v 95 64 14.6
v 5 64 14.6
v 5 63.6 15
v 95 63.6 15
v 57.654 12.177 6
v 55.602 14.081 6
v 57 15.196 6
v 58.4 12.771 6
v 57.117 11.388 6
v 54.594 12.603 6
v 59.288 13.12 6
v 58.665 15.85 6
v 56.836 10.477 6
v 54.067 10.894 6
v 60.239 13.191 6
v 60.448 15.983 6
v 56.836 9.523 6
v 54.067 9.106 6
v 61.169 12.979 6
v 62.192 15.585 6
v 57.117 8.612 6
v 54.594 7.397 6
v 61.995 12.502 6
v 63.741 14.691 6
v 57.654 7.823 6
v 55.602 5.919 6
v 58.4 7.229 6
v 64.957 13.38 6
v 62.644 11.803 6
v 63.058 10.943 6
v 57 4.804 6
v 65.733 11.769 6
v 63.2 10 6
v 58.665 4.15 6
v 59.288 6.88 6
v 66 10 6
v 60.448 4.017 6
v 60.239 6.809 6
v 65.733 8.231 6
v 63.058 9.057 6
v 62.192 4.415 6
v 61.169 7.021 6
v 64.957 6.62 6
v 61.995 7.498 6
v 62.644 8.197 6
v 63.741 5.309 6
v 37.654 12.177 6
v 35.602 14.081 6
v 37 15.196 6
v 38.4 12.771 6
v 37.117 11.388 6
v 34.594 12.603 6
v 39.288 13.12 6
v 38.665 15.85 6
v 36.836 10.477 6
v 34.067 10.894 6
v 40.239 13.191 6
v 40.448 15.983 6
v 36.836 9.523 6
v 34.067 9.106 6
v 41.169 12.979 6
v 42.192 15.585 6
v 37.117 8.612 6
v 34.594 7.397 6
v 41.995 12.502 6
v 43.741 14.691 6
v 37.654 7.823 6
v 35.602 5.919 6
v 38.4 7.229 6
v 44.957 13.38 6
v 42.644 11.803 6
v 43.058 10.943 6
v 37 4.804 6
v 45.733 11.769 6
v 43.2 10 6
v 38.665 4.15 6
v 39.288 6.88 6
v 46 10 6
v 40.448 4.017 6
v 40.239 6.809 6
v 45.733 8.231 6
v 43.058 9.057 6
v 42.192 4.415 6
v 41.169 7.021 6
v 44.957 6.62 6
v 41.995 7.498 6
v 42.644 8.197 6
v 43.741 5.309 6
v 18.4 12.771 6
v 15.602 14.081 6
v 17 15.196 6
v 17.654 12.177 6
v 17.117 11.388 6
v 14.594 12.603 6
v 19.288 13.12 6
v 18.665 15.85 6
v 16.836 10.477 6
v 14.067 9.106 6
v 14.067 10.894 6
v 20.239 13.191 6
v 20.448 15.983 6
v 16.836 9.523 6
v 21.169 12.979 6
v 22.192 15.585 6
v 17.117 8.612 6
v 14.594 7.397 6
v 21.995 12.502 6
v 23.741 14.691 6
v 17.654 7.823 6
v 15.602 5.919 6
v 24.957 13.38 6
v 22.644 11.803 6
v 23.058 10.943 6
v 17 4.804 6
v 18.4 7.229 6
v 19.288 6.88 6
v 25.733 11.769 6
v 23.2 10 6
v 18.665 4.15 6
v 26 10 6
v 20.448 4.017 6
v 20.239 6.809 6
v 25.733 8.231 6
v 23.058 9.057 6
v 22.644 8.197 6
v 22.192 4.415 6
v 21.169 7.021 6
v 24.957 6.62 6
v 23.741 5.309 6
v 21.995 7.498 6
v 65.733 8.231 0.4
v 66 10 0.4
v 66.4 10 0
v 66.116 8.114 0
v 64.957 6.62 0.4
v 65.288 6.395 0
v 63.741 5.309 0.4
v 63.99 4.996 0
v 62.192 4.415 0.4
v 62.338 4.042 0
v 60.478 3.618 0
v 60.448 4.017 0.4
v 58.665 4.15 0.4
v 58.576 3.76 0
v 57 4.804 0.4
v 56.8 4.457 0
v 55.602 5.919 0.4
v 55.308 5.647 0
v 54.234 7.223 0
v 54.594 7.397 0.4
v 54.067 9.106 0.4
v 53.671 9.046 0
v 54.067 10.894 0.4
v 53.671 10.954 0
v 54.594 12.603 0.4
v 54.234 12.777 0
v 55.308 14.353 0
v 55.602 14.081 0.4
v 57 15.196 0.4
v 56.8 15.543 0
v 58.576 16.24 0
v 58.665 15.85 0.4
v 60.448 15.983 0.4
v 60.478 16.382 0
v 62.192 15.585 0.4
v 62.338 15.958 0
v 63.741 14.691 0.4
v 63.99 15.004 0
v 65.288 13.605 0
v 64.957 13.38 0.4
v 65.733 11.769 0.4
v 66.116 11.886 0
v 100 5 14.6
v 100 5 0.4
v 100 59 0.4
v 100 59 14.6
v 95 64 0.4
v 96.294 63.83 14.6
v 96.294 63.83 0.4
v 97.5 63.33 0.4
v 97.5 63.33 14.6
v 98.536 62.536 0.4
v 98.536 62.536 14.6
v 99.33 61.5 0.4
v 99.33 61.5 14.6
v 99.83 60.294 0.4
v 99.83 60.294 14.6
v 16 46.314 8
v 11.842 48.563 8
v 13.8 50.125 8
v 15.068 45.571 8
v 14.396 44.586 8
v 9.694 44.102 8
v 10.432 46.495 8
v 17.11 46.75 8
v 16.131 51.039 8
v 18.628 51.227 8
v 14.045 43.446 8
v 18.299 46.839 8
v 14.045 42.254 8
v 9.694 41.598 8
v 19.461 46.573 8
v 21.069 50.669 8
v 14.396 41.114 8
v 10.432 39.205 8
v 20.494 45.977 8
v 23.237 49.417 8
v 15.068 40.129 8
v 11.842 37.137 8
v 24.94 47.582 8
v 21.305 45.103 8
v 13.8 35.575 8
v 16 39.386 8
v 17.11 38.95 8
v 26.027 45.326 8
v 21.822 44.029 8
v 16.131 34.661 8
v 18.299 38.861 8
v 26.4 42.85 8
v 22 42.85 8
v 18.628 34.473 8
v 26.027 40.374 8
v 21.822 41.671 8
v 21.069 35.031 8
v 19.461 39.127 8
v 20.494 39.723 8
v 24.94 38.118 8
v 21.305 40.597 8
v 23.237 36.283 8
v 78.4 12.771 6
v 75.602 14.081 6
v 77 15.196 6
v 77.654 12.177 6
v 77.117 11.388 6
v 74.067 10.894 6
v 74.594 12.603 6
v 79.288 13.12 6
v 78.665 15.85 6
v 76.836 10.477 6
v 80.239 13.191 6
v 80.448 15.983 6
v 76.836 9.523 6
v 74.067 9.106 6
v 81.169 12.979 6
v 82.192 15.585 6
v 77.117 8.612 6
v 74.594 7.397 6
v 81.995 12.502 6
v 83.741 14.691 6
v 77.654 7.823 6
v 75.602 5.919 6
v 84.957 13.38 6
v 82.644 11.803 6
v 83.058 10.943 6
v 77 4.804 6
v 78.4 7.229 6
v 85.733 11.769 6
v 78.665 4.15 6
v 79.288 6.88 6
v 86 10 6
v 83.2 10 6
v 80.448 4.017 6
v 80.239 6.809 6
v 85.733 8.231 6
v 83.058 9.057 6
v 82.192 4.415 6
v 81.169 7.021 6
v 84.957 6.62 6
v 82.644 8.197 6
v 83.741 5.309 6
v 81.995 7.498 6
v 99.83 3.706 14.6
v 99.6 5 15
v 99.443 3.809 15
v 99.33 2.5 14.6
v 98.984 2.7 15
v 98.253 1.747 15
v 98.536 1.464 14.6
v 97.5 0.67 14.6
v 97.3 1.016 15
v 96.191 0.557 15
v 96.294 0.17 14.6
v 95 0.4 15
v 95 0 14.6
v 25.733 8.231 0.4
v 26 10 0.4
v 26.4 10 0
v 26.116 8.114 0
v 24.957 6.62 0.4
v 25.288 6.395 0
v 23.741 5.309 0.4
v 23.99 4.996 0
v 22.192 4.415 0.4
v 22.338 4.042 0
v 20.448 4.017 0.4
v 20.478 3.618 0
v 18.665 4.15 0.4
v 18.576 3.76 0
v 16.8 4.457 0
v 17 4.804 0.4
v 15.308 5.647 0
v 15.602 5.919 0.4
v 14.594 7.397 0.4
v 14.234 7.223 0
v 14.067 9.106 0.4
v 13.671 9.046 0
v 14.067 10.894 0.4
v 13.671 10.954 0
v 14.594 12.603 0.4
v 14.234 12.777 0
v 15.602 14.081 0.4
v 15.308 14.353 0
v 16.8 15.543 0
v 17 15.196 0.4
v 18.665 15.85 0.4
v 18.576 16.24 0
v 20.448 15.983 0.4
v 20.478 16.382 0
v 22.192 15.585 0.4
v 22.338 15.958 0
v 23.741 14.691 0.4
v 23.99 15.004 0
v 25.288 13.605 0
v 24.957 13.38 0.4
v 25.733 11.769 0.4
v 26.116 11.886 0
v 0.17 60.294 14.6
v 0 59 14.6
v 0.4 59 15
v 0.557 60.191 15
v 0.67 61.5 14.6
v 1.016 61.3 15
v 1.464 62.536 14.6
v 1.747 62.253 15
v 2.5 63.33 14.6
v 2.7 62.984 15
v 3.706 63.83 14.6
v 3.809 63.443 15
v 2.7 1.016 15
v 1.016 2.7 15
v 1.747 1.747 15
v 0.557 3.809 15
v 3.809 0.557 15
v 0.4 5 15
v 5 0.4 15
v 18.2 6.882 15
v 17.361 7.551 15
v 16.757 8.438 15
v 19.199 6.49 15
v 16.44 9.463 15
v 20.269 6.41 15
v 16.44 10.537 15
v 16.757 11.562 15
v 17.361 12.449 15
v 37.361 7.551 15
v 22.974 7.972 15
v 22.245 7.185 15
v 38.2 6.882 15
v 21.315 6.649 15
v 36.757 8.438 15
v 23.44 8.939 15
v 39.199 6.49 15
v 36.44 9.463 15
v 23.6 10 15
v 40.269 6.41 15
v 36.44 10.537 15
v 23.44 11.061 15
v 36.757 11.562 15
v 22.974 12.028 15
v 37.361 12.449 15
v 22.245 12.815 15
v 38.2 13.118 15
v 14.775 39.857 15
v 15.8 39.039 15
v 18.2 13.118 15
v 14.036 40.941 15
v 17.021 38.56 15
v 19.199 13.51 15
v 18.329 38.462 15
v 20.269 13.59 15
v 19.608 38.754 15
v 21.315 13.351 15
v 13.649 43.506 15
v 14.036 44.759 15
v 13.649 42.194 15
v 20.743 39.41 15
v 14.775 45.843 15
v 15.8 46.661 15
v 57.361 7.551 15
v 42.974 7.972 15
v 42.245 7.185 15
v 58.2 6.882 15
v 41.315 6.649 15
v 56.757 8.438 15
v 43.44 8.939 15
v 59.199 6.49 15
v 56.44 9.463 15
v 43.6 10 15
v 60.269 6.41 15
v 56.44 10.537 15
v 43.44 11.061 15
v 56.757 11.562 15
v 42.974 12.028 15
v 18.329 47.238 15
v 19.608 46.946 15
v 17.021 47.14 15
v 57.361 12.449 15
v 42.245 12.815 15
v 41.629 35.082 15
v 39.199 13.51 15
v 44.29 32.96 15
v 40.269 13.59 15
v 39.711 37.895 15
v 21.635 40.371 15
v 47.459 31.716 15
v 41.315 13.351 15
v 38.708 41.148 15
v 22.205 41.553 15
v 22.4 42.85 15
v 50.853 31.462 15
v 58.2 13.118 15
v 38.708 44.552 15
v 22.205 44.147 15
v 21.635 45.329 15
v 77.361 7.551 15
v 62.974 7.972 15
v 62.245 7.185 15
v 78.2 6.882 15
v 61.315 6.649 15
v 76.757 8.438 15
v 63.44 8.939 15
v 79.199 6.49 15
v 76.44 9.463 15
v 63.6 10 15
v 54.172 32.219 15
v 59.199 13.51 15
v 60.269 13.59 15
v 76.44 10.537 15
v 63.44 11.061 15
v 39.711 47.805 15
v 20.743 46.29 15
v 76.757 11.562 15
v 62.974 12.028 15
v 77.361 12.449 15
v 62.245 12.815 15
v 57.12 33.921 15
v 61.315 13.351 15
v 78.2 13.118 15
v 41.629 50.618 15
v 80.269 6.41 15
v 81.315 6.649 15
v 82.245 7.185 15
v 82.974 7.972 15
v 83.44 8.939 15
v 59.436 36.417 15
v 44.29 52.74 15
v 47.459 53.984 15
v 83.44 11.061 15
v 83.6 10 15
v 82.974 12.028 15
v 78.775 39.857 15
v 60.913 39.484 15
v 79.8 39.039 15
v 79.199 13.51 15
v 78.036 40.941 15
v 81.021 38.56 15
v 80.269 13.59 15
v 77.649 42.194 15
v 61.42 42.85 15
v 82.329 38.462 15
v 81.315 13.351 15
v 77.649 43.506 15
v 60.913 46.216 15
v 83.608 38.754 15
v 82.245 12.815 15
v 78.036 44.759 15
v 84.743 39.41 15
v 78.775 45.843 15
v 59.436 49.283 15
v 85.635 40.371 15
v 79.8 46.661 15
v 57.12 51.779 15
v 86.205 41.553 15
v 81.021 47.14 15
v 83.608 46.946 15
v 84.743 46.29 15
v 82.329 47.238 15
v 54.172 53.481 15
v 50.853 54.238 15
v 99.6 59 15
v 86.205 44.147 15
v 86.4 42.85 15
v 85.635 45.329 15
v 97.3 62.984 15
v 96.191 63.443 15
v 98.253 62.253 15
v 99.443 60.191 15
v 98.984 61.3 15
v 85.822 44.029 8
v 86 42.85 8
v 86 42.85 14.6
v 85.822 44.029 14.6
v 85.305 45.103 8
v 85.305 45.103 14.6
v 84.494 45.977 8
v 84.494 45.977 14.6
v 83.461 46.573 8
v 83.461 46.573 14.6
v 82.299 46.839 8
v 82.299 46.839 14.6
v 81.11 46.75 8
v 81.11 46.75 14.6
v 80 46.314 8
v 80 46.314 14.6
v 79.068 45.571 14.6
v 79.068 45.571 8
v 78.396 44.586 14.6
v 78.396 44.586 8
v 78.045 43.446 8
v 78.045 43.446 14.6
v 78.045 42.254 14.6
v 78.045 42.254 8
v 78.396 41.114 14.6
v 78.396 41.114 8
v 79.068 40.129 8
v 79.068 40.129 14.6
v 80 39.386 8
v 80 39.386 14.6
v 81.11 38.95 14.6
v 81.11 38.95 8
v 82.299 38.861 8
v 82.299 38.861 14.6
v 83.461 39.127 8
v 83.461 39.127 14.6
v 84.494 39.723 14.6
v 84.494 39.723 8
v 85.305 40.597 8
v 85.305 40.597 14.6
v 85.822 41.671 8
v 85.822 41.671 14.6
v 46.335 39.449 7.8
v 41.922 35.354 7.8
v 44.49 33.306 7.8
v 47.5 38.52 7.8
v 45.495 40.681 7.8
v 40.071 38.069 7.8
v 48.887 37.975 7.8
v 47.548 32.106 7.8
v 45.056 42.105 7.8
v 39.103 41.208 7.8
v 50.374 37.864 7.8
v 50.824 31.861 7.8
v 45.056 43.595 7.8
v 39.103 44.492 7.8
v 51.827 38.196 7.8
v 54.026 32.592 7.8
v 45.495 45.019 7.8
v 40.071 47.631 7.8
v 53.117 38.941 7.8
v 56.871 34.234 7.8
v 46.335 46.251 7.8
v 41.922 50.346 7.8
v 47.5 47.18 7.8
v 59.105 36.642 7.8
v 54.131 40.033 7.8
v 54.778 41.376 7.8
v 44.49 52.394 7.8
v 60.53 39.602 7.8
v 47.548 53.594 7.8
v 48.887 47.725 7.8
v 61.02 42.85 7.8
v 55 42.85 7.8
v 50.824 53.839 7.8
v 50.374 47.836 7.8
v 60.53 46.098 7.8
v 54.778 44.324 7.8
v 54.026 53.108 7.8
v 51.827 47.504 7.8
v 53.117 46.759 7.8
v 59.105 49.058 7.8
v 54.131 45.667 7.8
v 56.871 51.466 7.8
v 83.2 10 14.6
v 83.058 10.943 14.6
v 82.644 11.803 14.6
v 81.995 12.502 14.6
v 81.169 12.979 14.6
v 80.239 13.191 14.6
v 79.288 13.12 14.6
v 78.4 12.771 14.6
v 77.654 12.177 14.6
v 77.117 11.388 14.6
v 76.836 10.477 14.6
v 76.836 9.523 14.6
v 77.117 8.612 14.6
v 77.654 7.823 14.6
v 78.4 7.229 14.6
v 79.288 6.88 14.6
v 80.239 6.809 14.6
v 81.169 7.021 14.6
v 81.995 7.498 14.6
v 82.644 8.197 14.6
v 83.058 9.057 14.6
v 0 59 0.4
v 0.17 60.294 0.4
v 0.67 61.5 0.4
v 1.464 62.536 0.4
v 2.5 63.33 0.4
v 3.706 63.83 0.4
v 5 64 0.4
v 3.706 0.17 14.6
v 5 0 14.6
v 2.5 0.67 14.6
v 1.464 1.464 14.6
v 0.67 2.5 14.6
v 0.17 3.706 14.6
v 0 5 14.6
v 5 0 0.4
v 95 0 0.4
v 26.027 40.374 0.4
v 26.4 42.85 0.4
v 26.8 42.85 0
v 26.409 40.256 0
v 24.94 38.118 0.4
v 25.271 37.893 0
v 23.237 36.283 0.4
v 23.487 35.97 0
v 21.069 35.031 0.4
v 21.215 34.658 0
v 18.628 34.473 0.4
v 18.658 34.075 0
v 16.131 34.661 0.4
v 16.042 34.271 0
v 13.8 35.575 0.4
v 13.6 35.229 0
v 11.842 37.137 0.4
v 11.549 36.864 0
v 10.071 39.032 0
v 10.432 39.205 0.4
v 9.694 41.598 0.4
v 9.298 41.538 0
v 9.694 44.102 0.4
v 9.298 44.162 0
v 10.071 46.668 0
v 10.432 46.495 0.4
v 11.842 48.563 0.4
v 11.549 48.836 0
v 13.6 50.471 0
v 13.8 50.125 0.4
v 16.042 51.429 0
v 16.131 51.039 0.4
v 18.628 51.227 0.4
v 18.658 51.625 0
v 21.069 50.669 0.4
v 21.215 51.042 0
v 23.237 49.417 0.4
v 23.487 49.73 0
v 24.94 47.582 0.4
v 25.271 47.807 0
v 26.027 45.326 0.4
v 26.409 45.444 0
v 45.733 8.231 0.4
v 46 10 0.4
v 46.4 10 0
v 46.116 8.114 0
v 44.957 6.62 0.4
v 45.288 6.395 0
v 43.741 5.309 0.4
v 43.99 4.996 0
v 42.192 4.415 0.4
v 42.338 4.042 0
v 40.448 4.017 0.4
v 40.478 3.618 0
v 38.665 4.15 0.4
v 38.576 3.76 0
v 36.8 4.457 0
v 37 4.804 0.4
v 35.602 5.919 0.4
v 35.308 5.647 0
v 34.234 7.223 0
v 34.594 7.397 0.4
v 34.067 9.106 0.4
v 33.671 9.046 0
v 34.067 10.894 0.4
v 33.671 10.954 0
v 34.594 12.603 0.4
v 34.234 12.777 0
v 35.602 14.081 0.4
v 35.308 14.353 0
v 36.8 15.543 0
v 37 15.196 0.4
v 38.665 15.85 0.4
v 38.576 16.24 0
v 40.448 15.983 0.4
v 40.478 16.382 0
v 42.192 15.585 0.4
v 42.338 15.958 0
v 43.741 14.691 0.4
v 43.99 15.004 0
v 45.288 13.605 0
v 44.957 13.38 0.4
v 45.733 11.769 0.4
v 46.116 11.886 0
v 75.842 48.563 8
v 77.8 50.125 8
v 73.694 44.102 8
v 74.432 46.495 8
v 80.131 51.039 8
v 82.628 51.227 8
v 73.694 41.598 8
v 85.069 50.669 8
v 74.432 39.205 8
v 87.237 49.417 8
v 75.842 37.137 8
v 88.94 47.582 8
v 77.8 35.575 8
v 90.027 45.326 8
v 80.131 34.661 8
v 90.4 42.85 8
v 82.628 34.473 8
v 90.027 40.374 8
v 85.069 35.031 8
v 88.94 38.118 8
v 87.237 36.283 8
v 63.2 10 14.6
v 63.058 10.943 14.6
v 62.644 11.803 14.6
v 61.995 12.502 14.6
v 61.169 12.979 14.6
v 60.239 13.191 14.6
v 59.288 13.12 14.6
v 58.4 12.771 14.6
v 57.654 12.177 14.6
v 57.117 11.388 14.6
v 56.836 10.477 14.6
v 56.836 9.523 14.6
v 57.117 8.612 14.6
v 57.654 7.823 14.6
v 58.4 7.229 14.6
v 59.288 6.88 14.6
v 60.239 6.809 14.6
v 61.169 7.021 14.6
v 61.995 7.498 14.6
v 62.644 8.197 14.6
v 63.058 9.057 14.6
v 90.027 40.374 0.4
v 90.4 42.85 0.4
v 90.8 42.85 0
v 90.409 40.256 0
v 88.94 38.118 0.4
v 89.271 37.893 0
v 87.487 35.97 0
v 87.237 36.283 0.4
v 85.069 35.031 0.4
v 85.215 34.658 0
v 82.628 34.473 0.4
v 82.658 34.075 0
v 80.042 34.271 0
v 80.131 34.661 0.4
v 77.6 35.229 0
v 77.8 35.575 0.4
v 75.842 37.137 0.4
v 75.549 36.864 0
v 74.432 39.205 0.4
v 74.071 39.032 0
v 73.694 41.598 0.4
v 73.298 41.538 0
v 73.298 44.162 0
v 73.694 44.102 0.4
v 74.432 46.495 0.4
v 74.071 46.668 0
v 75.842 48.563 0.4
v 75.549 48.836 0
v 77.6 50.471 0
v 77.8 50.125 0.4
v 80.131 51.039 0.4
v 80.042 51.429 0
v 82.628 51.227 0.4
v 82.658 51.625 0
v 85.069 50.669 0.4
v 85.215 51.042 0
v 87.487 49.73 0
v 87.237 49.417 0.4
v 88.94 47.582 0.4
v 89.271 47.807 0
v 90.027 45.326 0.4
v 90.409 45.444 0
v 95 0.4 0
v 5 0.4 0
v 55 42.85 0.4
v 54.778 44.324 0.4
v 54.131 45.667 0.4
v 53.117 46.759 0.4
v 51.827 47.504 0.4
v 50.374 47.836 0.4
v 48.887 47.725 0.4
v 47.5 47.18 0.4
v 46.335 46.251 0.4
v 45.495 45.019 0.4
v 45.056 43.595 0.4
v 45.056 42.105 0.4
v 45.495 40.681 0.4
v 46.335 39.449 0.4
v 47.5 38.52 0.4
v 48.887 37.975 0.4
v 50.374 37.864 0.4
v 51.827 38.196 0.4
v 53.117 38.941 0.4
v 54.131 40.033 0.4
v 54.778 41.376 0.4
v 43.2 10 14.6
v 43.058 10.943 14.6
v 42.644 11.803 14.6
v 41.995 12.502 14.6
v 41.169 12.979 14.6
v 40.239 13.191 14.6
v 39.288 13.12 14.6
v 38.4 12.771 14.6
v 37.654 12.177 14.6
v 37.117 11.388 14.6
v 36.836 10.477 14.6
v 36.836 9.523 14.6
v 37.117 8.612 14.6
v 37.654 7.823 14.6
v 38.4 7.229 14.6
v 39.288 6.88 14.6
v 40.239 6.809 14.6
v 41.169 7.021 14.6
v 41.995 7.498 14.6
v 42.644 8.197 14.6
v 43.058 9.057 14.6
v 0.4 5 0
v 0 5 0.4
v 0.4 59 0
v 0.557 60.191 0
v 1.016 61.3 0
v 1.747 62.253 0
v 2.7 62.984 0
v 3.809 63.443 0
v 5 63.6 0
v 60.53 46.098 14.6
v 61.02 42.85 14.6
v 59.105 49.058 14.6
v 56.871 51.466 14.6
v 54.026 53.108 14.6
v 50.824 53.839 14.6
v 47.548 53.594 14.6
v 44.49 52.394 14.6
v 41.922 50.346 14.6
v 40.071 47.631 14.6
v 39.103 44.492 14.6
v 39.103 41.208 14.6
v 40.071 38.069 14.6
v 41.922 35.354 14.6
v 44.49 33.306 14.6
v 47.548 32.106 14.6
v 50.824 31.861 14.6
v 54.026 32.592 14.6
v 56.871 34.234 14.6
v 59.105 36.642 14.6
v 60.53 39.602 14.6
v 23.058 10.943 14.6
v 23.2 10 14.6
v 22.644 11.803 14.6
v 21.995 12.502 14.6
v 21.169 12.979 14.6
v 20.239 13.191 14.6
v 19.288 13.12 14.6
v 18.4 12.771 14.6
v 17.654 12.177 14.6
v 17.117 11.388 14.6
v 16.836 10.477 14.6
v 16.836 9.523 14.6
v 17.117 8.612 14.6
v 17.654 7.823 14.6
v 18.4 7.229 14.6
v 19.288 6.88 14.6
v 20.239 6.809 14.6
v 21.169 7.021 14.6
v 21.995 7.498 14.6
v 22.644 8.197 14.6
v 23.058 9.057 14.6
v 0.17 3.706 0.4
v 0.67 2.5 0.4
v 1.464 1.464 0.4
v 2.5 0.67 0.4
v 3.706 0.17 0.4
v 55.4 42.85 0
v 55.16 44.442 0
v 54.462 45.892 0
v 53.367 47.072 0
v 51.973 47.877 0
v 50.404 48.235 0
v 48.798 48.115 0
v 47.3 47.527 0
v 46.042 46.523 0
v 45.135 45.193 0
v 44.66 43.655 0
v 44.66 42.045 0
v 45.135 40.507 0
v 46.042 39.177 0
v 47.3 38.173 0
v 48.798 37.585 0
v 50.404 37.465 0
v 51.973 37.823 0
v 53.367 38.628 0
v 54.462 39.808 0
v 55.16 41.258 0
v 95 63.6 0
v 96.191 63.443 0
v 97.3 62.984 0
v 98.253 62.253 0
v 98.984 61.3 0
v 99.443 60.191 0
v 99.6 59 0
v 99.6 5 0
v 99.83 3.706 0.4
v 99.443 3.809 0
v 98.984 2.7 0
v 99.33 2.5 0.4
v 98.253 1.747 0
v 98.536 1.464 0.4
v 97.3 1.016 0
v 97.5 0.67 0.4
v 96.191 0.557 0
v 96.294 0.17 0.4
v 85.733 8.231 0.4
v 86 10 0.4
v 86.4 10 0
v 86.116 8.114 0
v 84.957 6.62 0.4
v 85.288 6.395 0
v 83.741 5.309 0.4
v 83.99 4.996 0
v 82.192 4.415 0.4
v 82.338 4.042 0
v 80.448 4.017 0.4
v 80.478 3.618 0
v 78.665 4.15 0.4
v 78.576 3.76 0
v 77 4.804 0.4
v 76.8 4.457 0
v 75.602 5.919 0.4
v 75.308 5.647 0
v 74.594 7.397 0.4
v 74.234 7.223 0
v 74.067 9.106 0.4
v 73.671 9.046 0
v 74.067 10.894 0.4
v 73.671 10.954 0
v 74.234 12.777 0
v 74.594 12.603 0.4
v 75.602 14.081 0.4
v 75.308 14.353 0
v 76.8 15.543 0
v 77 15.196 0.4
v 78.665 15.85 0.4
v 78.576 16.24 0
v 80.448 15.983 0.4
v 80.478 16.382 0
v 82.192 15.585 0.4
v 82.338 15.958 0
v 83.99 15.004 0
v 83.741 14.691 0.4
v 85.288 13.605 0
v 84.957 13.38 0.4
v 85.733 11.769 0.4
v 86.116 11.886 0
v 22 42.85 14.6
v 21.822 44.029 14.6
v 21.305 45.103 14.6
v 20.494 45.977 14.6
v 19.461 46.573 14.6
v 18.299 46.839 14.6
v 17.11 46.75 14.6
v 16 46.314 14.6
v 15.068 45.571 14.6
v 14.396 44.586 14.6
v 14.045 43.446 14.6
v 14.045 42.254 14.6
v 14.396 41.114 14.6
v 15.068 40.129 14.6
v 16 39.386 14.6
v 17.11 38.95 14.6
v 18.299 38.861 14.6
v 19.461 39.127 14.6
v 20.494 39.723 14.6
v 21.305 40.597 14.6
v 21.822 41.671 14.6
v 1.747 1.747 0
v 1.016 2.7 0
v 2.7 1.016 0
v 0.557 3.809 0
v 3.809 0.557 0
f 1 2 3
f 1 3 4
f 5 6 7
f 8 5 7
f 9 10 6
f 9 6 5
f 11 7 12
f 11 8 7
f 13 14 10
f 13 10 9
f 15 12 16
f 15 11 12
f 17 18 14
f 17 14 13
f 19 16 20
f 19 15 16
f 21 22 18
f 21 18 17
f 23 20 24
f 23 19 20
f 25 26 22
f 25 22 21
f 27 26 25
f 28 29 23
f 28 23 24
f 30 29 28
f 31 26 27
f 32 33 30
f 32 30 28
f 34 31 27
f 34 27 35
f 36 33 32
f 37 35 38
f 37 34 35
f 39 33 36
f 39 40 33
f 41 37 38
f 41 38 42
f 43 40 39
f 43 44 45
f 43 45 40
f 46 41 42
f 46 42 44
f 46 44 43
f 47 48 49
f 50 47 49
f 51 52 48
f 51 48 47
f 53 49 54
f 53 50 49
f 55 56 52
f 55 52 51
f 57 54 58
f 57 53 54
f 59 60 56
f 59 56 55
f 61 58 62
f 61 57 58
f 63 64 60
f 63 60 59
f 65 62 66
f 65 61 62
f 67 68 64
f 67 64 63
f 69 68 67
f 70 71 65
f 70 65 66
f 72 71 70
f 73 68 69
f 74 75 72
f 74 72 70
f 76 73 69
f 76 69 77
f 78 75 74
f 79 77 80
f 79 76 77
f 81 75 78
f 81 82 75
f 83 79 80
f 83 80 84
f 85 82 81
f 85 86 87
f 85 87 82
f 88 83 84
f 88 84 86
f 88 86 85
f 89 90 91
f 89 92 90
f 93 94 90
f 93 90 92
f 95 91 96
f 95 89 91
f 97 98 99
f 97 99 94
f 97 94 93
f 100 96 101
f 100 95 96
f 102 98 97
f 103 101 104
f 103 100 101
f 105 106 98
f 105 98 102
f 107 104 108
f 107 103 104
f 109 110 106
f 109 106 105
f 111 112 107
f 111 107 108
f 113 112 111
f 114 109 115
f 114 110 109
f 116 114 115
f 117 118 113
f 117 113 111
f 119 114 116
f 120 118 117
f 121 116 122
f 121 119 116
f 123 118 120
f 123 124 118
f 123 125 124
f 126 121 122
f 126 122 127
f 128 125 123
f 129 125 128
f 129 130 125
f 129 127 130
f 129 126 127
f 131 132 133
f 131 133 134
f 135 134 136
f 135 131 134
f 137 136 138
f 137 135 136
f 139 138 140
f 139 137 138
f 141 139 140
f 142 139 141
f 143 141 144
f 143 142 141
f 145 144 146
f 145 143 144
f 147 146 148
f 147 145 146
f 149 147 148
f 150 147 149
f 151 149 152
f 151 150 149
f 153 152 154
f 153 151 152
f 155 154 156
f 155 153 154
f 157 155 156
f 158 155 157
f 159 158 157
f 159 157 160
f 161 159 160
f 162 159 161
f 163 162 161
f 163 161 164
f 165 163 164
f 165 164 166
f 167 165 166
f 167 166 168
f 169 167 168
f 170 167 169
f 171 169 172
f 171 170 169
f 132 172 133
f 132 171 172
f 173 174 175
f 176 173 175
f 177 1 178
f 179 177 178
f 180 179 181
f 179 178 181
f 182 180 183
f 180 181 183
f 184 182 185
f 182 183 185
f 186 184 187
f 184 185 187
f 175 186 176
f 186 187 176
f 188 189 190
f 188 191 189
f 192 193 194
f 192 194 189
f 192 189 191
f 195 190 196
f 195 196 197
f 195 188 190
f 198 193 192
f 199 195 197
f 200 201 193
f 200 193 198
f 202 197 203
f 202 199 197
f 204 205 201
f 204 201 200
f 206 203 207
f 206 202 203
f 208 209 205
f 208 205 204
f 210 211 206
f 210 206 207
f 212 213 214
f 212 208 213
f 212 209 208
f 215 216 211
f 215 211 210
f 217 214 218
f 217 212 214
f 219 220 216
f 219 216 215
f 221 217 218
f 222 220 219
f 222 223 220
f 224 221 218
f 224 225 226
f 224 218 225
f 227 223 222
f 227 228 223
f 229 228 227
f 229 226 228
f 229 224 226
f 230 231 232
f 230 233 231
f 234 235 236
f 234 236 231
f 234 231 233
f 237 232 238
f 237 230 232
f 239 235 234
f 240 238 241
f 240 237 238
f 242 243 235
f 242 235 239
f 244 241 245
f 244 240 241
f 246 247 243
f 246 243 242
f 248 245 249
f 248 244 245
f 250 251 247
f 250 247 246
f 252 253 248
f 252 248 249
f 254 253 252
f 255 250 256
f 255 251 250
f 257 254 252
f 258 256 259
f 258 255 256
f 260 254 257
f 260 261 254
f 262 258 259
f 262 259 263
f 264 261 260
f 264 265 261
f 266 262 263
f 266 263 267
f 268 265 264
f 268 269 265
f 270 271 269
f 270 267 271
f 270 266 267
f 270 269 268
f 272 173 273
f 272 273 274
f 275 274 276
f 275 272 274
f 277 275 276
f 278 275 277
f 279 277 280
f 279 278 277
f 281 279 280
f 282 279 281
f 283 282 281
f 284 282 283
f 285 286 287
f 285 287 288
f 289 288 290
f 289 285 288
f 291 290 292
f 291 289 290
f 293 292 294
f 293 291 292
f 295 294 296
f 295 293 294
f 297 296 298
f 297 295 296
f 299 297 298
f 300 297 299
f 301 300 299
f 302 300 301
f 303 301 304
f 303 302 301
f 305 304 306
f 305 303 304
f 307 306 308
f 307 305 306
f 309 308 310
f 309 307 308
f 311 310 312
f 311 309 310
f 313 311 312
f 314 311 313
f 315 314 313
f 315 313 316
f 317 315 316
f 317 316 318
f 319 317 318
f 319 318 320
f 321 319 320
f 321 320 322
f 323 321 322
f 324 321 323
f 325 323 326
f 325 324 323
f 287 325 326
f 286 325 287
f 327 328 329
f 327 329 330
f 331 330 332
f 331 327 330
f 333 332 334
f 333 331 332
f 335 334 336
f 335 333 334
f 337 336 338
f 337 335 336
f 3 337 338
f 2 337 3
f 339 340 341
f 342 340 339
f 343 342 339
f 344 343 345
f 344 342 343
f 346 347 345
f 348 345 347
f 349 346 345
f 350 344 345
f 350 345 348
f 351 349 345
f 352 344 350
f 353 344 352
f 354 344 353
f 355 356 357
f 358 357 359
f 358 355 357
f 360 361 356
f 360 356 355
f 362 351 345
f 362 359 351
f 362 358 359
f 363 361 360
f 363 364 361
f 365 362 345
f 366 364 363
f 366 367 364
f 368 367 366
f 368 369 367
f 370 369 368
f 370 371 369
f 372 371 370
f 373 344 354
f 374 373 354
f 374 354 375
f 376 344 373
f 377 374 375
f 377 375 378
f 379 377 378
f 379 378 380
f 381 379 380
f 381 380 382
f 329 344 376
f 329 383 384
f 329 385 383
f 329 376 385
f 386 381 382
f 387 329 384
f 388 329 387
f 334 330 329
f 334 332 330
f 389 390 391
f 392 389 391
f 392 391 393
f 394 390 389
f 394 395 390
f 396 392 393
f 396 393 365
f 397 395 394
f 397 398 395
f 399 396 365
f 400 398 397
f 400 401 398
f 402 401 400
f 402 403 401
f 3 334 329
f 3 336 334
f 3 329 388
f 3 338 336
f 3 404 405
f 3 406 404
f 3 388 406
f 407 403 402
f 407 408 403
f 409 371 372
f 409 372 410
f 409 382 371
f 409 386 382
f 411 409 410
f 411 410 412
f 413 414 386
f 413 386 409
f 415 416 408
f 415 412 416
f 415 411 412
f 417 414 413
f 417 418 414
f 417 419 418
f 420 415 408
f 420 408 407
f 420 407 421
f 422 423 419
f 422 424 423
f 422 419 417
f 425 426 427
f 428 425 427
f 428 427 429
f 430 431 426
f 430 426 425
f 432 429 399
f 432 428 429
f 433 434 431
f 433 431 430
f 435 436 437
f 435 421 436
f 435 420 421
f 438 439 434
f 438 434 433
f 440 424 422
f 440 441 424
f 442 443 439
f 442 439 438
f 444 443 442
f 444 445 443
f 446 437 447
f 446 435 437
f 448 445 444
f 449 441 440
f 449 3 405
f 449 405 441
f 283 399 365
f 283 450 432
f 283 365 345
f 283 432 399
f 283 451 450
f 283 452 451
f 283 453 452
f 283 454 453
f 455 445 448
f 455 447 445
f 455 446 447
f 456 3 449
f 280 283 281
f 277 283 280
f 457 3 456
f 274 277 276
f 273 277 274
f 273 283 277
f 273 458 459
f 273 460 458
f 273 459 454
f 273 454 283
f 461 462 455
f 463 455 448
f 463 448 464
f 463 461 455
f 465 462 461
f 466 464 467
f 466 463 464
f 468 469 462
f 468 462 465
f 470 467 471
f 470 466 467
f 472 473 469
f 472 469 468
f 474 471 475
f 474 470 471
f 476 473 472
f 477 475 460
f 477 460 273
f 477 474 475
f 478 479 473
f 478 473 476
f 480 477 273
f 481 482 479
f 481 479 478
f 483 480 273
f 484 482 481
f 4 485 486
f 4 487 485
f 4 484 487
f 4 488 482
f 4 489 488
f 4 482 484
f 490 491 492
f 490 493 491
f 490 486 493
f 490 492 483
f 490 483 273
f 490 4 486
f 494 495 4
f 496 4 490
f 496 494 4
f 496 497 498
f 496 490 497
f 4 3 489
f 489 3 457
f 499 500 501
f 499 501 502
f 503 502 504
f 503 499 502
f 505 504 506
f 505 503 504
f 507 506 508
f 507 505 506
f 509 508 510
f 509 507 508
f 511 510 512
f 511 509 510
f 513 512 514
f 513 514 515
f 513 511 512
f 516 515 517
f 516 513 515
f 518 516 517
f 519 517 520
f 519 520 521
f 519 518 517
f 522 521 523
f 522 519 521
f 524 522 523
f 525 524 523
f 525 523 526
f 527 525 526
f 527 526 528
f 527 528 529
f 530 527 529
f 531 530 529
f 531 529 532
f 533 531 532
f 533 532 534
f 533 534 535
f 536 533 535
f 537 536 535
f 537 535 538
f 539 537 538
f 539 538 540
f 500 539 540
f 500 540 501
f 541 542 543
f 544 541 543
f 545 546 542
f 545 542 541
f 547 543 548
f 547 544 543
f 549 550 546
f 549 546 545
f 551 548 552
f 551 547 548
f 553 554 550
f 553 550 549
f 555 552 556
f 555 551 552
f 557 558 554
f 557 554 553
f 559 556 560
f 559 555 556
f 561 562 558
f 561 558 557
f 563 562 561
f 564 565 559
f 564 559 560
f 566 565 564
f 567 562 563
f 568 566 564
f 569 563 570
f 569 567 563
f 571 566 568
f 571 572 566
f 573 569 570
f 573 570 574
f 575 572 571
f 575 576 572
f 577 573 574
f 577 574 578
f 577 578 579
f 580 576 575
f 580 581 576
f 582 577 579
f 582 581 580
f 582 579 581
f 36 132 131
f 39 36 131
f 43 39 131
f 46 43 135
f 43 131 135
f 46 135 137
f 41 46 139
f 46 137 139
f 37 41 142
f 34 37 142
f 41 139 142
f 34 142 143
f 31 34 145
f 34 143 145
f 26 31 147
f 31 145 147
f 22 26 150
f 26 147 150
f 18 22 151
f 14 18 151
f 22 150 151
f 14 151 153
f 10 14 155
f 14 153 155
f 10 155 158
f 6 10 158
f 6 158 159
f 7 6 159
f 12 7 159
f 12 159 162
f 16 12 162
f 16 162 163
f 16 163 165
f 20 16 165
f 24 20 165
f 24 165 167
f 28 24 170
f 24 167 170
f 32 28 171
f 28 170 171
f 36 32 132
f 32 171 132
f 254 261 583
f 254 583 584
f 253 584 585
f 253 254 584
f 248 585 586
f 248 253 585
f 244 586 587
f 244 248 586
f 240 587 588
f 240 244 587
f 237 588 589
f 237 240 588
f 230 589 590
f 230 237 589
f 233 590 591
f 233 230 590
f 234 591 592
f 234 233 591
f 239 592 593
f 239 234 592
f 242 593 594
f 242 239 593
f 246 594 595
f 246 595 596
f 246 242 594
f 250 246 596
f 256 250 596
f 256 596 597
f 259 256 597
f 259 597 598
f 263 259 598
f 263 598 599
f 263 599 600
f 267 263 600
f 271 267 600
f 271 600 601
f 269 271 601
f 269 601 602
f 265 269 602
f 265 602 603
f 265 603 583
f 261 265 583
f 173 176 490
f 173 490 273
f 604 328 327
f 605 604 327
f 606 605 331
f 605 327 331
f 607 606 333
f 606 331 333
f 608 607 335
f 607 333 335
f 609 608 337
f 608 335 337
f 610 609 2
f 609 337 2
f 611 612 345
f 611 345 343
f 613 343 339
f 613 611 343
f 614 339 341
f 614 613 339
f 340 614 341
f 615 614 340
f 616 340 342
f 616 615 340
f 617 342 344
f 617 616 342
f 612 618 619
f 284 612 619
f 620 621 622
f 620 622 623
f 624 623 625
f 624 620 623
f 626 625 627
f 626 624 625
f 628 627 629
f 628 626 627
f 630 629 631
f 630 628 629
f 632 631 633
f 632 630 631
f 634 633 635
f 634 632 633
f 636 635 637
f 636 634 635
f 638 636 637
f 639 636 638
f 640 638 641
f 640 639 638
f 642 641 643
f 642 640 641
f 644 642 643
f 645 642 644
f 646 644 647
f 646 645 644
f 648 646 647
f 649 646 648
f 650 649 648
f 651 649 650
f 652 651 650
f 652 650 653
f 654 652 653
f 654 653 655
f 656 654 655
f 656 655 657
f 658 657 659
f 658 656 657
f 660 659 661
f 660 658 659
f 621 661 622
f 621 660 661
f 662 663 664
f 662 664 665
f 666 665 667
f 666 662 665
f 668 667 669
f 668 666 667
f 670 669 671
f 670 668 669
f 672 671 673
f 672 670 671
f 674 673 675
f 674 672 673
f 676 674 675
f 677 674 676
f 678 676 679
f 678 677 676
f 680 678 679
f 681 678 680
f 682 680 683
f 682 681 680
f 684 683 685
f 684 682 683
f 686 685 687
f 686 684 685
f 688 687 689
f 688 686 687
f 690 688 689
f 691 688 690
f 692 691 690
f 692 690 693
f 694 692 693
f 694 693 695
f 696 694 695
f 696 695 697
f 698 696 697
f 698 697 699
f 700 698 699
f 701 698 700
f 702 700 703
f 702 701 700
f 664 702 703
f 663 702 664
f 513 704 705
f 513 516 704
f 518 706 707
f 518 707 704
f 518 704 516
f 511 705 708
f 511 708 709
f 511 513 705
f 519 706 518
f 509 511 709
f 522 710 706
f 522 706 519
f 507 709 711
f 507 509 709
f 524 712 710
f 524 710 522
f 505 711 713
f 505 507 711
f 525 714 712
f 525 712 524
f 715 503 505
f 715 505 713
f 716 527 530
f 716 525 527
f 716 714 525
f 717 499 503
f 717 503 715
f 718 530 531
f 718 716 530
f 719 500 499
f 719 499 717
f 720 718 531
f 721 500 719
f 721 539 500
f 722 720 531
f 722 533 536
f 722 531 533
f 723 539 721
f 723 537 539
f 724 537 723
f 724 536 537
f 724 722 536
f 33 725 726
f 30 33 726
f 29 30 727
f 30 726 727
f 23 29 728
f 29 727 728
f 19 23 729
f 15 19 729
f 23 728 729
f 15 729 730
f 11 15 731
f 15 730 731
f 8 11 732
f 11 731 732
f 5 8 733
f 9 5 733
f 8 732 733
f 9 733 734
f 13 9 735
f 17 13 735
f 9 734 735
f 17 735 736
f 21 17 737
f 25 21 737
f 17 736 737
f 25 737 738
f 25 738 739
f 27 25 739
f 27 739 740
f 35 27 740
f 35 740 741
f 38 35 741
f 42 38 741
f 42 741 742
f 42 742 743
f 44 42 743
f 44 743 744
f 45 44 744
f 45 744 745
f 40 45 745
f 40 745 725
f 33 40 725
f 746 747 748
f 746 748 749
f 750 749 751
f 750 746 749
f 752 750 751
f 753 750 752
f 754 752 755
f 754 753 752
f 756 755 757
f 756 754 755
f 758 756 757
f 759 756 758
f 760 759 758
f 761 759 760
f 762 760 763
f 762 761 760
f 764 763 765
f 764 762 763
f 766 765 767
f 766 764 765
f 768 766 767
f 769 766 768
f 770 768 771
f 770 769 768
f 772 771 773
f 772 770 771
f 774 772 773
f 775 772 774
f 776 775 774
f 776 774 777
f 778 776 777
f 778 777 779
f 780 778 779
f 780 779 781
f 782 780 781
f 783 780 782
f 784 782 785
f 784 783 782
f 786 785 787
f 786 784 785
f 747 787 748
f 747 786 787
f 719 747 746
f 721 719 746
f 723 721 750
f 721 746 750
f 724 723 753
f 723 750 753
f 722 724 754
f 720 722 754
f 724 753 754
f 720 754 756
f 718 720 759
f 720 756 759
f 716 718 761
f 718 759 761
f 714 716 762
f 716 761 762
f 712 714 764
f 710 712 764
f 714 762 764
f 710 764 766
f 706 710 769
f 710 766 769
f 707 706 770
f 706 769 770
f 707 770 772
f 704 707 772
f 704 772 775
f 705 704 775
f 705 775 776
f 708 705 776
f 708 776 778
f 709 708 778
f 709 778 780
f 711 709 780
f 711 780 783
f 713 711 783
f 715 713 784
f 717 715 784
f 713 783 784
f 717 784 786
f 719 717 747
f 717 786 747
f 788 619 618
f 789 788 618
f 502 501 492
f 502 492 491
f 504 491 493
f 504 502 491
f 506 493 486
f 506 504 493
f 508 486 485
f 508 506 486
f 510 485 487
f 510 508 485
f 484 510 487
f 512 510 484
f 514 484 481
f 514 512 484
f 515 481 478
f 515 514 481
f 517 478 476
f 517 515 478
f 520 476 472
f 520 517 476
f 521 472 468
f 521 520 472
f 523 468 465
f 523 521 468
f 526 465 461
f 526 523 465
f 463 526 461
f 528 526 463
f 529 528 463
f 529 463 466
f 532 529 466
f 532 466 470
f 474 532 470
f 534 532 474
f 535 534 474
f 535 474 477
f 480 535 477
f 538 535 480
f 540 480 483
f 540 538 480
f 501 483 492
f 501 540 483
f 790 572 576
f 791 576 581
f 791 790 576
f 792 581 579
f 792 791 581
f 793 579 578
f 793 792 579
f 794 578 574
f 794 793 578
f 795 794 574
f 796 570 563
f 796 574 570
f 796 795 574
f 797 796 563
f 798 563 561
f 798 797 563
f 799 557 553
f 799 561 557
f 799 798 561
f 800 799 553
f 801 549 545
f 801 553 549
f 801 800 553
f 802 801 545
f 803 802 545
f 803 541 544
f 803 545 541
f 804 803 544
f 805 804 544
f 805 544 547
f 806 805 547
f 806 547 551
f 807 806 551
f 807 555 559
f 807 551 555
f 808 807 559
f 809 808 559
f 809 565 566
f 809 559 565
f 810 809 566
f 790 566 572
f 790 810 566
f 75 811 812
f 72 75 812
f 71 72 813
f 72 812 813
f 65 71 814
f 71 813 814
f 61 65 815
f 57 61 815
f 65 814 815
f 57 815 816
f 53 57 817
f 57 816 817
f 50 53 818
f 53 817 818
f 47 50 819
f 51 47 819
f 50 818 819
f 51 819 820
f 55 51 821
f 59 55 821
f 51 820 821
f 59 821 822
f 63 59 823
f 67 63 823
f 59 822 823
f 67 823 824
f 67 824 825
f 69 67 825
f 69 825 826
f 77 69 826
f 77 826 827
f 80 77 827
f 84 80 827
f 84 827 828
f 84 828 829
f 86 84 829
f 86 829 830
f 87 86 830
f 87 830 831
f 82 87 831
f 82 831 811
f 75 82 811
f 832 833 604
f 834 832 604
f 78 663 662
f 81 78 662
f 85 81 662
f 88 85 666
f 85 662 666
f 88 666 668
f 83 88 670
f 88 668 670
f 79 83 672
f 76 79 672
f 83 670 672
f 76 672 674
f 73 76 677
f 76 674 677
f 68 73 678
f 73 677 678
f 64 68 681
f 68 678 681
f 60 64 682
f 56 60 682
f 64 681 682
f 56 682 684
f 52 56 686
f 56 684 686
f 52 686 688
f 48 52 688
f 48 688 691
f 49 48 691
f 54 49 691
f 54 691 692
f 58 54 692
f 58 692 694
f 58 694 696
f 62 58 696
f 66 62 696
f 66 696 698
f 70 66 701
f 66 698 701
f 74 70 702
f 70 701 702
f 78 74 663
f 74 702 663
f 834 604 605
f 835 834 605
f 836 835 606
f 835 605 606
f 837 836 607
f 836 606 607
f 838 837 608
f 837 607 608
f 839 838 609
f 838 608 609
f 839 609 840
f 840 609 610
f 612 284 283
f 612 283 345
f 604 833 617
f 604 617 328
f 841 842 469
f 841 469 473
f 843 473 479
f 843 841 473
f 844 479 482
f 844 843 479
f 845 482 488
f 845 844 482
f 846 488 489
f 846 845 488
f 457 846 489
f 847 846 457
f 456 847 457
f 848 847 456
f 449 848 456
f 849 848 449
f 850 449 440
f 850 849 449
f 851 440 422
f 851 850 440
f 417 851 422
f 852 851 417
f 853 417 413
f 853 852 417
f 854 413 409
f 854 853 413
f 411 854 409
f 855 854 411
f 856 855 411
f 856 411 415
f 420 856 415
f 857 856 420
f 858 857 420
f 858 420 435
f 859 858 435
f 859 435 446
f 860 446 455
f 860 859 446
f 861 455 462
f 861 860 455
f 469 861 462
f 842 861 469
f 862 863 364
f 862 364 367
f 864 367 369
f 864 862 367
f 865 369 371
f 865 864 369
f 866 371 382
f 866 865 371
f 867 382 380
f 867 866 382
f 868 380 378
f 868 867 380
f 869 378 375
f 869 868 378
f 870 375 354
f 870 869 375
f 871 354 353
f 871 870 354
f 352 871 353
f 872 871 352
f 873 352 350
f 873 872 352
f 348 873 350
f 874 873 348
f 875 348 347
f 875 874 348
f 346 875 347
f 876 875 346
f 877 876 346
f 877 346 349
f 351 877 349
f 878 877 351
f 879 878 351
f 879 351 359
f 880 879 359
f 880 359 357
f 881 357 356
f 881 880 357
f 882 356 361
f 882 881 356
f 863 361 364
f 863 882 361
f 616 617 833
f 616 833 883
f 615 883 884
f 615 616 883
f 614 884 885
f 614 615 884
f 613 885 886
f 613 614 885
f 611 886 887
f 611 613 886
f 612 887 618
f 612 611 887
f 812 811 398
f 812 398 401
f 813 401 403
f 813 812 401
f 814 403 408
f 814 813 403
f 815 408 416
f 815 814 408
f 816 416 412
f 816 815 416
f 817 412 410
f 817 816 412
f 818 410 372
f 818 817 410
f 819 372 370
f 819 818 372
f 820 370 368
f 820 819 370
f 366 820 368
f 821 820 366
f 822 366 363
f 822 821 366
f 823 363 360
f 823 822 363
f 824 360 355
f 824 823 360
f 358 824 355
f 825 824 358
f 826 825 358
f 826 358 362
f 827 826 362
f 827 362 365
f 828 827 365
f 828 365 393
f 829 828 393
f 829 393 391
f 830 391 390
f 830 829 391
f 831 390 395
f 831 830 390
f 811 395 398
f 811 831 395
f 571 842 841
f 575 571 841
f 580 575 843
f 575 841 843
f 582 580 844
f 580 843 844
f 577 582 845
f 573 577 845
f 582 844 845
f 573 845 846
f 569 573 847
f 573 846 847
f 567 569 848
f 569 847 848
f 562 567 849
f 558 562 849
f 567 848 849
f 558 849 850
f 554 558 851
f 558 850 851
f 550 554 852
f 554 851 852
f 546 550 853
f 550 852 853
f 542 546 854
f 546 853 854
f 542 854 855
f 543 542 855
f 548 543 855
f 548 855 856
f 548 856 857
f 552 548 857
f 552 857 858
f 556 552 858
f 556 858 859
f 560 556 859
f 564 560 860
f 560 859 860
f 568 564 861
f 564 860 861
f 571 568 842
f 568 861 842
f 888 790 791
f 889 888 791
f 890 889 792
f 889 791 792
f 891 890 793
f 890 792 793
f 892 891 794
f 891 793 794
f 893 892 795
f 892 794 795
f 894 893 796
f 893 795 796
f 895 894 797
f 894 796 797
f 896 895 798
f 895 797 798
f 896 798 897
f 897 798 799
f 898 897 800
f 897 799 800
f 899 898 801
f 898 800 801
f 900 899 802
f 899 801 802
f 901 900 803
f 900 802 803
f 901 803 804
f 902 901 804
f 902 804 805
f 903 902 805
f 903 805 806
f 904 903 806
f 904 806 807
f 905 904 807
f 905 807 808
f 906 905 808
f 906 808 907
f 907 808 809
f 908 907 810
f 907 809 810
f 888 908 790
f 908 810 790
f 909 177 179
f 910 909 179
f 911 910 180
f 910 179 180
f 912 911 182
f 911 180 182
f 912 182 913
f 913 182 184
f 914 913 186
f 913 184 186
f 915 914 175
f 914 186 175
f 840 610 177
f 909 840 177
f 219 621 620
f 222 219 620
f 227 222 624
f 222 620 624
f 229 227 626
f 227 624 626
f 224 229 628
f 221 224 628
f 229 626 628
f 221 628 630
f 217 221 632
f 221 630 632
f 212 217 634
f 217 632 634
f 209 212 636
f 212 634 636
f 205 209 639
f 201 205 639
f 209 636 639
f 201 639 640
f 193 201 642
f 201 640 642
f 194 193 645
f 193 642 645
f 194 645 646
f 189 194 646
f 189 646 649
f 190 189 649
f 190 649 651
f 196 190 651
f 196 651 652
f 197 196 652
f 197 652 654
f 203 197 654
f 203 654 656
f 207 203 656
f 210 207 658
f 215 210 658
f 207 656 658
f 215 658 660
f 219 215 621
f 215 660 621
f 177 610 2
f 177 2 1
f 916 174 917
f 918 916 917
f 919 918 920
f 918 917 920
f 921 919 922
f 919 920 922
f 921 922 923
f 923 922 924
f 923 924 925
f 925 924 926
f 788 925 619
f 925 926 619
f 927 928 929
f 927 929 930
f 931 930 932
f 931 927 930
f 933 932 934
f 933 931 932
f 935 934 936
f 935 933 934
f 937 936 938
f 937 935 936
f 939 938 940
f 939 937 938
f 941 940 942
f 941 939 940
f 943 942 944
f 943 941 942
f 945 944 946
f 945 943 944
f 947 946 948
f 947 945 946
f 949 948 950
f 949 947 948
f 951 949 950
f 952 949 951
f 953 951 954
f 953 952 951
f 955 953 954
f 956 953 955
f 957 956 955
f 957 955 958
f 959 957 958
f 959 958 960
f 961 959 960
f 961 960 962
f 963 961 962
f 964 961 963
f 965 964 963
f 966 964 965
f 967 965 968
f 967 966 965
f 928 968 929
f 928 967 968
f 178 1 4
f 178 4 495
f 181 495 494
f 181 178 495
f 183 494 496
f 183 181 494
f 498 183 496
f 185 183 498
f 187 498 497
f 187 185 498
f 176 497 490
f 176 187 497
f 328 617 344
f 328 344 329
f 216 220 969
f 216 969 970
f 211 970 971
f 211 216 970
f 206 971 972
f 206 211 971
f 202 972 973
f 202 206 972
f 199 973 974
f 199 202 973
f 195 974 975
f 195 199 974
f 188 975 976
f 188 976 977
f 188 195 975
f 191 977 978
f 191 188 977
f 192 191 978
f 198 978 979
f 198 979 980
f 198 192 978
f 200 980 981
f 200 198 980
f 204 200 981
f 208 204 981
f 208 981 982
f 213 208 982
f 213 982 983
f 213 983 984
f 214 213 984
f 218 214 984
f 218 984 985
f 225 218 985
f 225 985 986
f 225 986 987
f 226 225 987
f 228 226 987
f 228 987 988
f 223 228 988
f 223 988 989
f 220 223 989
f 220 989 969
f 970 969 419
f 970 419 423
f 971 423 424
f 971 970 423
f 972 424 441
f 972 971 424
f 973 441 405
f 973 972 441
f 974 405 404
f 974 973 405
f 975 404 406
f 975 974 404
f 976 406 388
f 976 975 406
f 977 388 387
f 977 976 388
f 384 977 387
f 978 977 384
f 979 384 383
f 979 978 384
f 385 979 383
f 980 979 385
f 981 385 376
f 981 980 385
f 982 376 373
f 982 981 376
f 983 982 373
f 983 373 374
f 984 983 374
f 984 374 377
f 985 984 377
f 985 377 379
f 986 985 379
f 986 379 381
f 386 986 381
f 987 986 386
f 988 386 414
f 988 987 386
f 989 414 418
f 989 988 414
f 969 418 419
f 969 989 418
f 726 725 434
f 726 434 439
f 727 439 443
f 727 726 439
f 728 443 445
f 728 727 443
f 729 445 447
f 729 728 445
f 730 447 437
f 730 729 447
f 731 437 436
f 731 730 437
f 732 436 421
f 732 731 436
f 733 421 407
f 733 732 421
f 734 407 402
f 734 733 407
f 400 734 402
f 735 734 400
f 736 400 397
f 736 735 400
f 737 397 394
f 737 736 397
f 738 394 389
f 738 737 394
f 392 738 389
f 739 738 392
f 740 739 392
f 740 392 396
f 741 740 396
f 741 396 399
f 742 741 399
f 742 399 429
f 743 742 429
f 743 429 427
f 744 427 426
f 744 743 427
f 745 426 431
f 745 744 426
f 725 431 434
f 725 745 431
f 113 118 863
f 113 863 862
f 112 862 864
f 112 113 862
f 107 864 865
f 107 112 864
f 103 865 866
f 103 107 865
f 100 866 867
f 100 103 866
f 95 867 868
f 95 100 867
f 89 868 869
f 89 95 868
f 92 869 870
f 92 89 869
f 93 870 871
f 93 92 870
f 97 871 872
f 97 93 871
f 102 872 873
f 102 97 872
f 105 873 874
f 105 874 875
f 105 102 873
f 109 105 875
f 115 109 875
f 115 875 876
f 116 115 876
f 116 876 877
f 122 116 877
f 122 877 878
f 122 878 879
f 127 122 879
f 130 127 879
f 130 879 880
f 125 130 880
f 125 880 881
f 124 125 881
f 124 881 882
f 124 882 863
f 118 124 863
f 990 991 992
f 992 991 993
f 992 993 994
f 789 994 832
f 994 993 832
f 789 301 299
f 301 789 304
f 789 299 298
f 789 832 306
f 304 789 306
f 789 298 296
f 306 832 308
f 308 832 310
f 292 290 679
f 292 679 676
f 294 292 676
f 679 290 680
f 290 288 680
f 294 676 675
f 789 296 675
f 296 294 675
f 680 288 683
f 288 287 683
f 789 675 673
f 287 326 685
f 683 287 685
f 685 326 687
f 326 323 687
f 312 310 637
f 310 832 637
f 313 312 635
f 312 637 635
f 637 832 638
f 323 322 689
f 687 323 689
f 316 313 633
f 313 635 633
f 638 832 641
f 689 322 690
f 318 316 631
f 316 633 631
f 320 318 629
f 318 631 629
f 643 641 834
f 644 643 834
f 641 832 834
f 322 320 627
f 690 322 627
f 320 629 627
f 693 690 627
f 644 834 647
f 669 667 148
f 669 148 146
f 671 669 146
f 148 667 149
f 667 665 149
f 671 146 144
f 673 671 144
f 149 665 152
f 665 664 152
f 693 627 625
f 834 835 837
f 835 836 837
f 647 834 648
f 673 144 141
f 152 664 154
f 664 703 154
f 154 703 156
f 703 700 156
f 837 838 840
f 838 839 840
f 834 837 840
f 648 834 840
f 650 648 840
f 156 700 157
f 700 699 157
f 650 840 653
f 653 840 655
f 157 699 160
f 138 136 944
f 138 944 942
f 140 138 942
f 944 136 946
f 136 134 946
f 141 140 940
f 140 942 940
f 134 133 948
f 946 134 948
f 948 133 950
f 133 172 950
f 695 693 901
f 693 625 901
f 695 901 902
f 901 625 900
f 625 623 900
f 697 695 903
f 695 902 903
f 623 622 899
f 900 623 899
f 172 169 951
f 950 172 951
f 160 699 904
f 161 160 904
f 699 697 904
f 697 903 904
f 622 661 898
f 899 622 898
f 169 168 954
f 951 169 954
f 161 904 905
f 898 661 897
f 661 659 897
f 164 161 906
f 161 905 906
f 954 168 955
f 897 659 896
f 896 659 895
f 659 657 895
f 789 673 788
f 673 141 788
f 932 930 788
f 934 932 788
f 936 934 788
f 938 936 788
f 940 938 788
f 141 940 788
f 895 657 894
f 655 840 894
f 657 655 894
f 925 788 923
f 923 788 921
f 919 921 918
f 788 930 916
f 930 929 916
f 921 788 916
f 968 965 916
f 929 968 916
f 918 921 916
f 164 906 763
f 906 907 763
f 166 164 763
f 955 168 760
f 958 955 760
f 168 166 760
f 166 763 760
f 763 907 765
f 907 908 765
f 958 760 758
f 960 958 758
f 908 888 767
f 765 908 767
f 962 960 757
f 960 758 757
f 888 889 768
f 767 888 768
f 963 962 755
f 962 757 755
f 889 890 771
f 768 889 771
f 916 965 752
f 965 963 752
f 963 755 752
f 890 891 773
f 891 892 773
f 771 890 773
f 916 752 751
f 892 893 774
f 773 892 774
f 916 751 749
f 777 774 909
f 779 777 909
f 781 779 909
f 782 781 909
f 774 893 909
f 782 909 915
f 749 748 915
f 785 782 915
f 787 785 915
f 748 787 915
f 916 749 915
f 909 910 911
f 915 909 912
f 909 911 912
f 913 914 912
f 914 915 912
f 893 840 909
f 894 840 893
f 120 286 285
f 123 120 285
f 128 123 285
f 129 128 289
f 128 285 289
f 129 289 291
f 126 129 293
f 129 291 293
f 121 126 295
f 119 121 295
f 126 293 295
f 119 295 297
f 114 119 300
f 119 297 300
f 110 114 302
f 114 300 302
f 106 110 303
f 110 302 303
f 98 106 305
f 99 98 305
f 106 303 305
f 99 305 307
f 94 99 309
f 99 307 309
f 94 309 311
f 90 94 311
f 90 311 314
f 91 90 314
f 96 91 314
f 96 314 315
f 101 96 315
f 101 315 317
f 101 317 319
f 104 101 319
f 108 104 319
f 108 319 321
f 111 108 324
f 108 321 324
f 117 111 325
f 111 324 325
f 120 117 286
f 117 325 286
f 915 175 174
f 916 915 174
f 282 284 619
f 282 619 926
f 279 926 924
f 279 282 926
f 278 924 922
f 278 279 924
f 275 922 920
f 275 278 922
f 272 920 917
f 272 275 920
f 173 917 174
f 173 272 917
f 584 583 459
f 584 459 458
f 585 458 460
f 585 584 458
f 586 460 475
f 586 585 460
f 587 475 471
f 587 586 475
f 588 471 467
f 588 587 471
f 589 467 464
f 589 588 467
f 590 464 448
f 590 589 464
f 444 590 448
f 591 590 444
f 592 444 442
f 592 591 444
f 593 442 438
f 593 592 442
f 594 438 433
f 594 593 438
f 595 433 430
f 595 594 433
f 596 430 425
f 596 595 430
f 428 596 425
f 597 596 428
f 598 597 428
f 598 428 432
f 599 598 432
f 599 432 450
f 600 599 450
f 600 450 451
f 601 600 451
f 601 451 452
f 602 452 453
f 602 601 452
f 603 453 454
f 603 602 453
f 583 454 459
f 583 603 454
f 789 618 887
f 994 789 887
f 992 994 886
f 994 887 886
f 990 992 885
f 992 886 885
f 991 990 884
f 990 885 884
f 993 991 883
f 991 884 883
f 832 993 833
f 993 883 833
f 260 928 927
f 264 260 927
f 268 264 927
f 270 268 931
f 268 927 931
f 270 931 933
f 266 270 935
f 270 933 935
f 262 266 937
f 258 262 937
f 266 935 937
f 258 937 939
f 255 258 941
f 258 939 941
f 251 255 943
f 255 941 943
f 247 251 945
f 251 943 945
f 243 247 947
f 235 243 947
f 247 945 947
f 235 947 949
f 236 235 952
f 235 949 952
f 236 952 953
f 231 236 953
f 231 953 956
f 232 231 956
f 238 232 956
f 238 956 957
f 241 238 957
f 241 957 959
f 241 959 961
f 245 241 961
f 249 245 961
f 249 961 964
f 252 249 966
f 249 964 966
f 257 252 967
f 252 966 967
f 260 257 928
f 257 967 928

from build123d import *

# Parameters (mm, degrees)
SKETCH_W        = 100
SKETCH_H        = 64
SKETCH_R        = 5
SKETCH_R_2      = 3.2
SKETCH_R_3      = 4
PAD_DEPTH       = 15
SKETCH001_R     = 11.02
POCKET_DEPTH    = 7.2
SKETCH002_R     = 6
POCKET001_DEPTH = 6
SKETCH003_R     = 3.2
POCKET002_DEPTH = 15
SKETCH004_R     = 8.4
POCKET003_DEPTH = 8
FILLET_R        = 5
CHAMFER_SIZE    = 0.4
CHAMFER001_SIZE = 0.4


with BuildPart() as part:
    # Sketch → Pad (new body)
    with BuildSketch(Plane.XY):
        with Locations((50, 32)):
            Rectangle(SKETCH_W, SKETCH_H)
        with Locations((50, 42.85)):
            Circle(SKETCH_R, mode=Mode.SUBTRACT)
        with Locations((20, 10)):
            Circle(SKETCH_R_2, mode=Mode.SUBTRACT)
        with Locations((80, 10)):
            Circle(SKETCH_R_2, mode=Mode.SUBTRACT)
        with Locations((82, 42.85)):
            Circle(SKETCH_R_3, mode=Mode.SUBTRACT)
        with Locations((18, 42.85)):
            Circle(SKETCH_R_3, mode=Mode.SUBTRACT)
    extrude(amount=PAD_DEPTH)

    # Sketch001 (on Face11 of Pad) → Pocket (cut)
    with BuildSketch(Plane.XY.offset(15)):
        with Locations((50, 42.85)):
            Circle(SKETCH001_R)
    extrude(amount=-POCKET_DEPTH, mode=Mode.SUBTRACT)

    # Sketch002 (on Face4 of Pocket) → Pocket001 (cut)
    with BuildSketch(Plane(origin=(0, 0, 0), x_dir=(1, 0, 0), z_dir=(0, 0, -1))):
        with Locations((20, -10)):
            Circle(SKETCH002_R)
        with Locations((80, -10)):
            Circle(SKETCH002_R)
        with Locations((40, -10)):
            Circle(SKETCH002_R)
        with Locations((60, -10)):
            Circle(SKETCH002_R)
    extrude(amount=-POCKET001_DEPTH, mode=Mode.SUBTRACT)

    # Sketch003 (on Face5 of Pocket001) → Pocket002 (cut)
    with BuildSketch(Plane.XY.offset(15)):
        with Locations((40, 10)):
            Circle(SKETCH003_R)
        with Locations((60, 10)):
            Circle(SKETCH003_R)
    extrude(amount=-POCKET002_DEPTH, mode=Mode.SUBTRACT)

    # Sketch004 (on Face4 of Pocket002) → Pocket003 (cut)
    with BuildSketch(Plane(origin=(0, 0, 0), x_dir=(1, 0, 0), z_dir=(0, 0, -1))):
        with Locations((18, -42.85)):
            Circle(SKETCH004_R)
        with Locations((82, -42.85)):
            Circle(SKETCH004_R)
    extrude(amount=-POCKET003_DEPTH, mode=Mode.SUBTRACT)

    # Fillet
    fillet_edges = [part.edges().sort_by_distance(p)[0] for p in [
        (100, 0, 7.5),
        (0, 0, 7.5),
        (100, 64, 7.5),
        (0, 64, 7.5),
    ]]
    fillet(fillet_edges, radius=FILLET_R)

    # Chamfer
    chamfer_edges = [part.edges().sort_by_distance(p)[0] for p in [
        (50, 64, 15),
        (1.464466, 62.535534, 15),
        (98.535534, 62.535534, 15),
        (0, 32, 15),
        (100, 32, 15),
        (1.464466, 1.464466, 15),
        (98.535534, 1.464466, 15),
        (50, 0, 15),
        (76.8, 10, 15),
        (56.8, 10, 15),
        (36.8, 10, 15),
        (16.8, 10, 15),
        (78, 42.85, 15),
        (38.98, 42.85, 15),
        (14, 42.85, 15),
    ]]
    chamfer(chamfer_edges, length=CHAMFER_SIZE)

    # Chamfer001
    chamfer001_edges = [part.edges().sort_by_distance(p)[0] for p in [
        (50, 64, 0),
        (1.464466, 62.535534, 0),
        (98.535534, 62.535534, 0),
        (0, 32, 0),
        (100, 32, 0),
        (1.464466, 1.464466, 0),
        (98.535534, 1.464466, 0),
        (50, 0, 0),
        (74, 10, 0),
        (54, 10, 0),
        (34, 10, 0),
        (14, 10, 0),
        (73.6, 42.85, 0),
        (45, 42.85, 0),
        (9.6, 42.85, 0),
    ]]
    chamfer(chamfer001_edges, length=CHAMFER001_SIZE)


solid = part.part
